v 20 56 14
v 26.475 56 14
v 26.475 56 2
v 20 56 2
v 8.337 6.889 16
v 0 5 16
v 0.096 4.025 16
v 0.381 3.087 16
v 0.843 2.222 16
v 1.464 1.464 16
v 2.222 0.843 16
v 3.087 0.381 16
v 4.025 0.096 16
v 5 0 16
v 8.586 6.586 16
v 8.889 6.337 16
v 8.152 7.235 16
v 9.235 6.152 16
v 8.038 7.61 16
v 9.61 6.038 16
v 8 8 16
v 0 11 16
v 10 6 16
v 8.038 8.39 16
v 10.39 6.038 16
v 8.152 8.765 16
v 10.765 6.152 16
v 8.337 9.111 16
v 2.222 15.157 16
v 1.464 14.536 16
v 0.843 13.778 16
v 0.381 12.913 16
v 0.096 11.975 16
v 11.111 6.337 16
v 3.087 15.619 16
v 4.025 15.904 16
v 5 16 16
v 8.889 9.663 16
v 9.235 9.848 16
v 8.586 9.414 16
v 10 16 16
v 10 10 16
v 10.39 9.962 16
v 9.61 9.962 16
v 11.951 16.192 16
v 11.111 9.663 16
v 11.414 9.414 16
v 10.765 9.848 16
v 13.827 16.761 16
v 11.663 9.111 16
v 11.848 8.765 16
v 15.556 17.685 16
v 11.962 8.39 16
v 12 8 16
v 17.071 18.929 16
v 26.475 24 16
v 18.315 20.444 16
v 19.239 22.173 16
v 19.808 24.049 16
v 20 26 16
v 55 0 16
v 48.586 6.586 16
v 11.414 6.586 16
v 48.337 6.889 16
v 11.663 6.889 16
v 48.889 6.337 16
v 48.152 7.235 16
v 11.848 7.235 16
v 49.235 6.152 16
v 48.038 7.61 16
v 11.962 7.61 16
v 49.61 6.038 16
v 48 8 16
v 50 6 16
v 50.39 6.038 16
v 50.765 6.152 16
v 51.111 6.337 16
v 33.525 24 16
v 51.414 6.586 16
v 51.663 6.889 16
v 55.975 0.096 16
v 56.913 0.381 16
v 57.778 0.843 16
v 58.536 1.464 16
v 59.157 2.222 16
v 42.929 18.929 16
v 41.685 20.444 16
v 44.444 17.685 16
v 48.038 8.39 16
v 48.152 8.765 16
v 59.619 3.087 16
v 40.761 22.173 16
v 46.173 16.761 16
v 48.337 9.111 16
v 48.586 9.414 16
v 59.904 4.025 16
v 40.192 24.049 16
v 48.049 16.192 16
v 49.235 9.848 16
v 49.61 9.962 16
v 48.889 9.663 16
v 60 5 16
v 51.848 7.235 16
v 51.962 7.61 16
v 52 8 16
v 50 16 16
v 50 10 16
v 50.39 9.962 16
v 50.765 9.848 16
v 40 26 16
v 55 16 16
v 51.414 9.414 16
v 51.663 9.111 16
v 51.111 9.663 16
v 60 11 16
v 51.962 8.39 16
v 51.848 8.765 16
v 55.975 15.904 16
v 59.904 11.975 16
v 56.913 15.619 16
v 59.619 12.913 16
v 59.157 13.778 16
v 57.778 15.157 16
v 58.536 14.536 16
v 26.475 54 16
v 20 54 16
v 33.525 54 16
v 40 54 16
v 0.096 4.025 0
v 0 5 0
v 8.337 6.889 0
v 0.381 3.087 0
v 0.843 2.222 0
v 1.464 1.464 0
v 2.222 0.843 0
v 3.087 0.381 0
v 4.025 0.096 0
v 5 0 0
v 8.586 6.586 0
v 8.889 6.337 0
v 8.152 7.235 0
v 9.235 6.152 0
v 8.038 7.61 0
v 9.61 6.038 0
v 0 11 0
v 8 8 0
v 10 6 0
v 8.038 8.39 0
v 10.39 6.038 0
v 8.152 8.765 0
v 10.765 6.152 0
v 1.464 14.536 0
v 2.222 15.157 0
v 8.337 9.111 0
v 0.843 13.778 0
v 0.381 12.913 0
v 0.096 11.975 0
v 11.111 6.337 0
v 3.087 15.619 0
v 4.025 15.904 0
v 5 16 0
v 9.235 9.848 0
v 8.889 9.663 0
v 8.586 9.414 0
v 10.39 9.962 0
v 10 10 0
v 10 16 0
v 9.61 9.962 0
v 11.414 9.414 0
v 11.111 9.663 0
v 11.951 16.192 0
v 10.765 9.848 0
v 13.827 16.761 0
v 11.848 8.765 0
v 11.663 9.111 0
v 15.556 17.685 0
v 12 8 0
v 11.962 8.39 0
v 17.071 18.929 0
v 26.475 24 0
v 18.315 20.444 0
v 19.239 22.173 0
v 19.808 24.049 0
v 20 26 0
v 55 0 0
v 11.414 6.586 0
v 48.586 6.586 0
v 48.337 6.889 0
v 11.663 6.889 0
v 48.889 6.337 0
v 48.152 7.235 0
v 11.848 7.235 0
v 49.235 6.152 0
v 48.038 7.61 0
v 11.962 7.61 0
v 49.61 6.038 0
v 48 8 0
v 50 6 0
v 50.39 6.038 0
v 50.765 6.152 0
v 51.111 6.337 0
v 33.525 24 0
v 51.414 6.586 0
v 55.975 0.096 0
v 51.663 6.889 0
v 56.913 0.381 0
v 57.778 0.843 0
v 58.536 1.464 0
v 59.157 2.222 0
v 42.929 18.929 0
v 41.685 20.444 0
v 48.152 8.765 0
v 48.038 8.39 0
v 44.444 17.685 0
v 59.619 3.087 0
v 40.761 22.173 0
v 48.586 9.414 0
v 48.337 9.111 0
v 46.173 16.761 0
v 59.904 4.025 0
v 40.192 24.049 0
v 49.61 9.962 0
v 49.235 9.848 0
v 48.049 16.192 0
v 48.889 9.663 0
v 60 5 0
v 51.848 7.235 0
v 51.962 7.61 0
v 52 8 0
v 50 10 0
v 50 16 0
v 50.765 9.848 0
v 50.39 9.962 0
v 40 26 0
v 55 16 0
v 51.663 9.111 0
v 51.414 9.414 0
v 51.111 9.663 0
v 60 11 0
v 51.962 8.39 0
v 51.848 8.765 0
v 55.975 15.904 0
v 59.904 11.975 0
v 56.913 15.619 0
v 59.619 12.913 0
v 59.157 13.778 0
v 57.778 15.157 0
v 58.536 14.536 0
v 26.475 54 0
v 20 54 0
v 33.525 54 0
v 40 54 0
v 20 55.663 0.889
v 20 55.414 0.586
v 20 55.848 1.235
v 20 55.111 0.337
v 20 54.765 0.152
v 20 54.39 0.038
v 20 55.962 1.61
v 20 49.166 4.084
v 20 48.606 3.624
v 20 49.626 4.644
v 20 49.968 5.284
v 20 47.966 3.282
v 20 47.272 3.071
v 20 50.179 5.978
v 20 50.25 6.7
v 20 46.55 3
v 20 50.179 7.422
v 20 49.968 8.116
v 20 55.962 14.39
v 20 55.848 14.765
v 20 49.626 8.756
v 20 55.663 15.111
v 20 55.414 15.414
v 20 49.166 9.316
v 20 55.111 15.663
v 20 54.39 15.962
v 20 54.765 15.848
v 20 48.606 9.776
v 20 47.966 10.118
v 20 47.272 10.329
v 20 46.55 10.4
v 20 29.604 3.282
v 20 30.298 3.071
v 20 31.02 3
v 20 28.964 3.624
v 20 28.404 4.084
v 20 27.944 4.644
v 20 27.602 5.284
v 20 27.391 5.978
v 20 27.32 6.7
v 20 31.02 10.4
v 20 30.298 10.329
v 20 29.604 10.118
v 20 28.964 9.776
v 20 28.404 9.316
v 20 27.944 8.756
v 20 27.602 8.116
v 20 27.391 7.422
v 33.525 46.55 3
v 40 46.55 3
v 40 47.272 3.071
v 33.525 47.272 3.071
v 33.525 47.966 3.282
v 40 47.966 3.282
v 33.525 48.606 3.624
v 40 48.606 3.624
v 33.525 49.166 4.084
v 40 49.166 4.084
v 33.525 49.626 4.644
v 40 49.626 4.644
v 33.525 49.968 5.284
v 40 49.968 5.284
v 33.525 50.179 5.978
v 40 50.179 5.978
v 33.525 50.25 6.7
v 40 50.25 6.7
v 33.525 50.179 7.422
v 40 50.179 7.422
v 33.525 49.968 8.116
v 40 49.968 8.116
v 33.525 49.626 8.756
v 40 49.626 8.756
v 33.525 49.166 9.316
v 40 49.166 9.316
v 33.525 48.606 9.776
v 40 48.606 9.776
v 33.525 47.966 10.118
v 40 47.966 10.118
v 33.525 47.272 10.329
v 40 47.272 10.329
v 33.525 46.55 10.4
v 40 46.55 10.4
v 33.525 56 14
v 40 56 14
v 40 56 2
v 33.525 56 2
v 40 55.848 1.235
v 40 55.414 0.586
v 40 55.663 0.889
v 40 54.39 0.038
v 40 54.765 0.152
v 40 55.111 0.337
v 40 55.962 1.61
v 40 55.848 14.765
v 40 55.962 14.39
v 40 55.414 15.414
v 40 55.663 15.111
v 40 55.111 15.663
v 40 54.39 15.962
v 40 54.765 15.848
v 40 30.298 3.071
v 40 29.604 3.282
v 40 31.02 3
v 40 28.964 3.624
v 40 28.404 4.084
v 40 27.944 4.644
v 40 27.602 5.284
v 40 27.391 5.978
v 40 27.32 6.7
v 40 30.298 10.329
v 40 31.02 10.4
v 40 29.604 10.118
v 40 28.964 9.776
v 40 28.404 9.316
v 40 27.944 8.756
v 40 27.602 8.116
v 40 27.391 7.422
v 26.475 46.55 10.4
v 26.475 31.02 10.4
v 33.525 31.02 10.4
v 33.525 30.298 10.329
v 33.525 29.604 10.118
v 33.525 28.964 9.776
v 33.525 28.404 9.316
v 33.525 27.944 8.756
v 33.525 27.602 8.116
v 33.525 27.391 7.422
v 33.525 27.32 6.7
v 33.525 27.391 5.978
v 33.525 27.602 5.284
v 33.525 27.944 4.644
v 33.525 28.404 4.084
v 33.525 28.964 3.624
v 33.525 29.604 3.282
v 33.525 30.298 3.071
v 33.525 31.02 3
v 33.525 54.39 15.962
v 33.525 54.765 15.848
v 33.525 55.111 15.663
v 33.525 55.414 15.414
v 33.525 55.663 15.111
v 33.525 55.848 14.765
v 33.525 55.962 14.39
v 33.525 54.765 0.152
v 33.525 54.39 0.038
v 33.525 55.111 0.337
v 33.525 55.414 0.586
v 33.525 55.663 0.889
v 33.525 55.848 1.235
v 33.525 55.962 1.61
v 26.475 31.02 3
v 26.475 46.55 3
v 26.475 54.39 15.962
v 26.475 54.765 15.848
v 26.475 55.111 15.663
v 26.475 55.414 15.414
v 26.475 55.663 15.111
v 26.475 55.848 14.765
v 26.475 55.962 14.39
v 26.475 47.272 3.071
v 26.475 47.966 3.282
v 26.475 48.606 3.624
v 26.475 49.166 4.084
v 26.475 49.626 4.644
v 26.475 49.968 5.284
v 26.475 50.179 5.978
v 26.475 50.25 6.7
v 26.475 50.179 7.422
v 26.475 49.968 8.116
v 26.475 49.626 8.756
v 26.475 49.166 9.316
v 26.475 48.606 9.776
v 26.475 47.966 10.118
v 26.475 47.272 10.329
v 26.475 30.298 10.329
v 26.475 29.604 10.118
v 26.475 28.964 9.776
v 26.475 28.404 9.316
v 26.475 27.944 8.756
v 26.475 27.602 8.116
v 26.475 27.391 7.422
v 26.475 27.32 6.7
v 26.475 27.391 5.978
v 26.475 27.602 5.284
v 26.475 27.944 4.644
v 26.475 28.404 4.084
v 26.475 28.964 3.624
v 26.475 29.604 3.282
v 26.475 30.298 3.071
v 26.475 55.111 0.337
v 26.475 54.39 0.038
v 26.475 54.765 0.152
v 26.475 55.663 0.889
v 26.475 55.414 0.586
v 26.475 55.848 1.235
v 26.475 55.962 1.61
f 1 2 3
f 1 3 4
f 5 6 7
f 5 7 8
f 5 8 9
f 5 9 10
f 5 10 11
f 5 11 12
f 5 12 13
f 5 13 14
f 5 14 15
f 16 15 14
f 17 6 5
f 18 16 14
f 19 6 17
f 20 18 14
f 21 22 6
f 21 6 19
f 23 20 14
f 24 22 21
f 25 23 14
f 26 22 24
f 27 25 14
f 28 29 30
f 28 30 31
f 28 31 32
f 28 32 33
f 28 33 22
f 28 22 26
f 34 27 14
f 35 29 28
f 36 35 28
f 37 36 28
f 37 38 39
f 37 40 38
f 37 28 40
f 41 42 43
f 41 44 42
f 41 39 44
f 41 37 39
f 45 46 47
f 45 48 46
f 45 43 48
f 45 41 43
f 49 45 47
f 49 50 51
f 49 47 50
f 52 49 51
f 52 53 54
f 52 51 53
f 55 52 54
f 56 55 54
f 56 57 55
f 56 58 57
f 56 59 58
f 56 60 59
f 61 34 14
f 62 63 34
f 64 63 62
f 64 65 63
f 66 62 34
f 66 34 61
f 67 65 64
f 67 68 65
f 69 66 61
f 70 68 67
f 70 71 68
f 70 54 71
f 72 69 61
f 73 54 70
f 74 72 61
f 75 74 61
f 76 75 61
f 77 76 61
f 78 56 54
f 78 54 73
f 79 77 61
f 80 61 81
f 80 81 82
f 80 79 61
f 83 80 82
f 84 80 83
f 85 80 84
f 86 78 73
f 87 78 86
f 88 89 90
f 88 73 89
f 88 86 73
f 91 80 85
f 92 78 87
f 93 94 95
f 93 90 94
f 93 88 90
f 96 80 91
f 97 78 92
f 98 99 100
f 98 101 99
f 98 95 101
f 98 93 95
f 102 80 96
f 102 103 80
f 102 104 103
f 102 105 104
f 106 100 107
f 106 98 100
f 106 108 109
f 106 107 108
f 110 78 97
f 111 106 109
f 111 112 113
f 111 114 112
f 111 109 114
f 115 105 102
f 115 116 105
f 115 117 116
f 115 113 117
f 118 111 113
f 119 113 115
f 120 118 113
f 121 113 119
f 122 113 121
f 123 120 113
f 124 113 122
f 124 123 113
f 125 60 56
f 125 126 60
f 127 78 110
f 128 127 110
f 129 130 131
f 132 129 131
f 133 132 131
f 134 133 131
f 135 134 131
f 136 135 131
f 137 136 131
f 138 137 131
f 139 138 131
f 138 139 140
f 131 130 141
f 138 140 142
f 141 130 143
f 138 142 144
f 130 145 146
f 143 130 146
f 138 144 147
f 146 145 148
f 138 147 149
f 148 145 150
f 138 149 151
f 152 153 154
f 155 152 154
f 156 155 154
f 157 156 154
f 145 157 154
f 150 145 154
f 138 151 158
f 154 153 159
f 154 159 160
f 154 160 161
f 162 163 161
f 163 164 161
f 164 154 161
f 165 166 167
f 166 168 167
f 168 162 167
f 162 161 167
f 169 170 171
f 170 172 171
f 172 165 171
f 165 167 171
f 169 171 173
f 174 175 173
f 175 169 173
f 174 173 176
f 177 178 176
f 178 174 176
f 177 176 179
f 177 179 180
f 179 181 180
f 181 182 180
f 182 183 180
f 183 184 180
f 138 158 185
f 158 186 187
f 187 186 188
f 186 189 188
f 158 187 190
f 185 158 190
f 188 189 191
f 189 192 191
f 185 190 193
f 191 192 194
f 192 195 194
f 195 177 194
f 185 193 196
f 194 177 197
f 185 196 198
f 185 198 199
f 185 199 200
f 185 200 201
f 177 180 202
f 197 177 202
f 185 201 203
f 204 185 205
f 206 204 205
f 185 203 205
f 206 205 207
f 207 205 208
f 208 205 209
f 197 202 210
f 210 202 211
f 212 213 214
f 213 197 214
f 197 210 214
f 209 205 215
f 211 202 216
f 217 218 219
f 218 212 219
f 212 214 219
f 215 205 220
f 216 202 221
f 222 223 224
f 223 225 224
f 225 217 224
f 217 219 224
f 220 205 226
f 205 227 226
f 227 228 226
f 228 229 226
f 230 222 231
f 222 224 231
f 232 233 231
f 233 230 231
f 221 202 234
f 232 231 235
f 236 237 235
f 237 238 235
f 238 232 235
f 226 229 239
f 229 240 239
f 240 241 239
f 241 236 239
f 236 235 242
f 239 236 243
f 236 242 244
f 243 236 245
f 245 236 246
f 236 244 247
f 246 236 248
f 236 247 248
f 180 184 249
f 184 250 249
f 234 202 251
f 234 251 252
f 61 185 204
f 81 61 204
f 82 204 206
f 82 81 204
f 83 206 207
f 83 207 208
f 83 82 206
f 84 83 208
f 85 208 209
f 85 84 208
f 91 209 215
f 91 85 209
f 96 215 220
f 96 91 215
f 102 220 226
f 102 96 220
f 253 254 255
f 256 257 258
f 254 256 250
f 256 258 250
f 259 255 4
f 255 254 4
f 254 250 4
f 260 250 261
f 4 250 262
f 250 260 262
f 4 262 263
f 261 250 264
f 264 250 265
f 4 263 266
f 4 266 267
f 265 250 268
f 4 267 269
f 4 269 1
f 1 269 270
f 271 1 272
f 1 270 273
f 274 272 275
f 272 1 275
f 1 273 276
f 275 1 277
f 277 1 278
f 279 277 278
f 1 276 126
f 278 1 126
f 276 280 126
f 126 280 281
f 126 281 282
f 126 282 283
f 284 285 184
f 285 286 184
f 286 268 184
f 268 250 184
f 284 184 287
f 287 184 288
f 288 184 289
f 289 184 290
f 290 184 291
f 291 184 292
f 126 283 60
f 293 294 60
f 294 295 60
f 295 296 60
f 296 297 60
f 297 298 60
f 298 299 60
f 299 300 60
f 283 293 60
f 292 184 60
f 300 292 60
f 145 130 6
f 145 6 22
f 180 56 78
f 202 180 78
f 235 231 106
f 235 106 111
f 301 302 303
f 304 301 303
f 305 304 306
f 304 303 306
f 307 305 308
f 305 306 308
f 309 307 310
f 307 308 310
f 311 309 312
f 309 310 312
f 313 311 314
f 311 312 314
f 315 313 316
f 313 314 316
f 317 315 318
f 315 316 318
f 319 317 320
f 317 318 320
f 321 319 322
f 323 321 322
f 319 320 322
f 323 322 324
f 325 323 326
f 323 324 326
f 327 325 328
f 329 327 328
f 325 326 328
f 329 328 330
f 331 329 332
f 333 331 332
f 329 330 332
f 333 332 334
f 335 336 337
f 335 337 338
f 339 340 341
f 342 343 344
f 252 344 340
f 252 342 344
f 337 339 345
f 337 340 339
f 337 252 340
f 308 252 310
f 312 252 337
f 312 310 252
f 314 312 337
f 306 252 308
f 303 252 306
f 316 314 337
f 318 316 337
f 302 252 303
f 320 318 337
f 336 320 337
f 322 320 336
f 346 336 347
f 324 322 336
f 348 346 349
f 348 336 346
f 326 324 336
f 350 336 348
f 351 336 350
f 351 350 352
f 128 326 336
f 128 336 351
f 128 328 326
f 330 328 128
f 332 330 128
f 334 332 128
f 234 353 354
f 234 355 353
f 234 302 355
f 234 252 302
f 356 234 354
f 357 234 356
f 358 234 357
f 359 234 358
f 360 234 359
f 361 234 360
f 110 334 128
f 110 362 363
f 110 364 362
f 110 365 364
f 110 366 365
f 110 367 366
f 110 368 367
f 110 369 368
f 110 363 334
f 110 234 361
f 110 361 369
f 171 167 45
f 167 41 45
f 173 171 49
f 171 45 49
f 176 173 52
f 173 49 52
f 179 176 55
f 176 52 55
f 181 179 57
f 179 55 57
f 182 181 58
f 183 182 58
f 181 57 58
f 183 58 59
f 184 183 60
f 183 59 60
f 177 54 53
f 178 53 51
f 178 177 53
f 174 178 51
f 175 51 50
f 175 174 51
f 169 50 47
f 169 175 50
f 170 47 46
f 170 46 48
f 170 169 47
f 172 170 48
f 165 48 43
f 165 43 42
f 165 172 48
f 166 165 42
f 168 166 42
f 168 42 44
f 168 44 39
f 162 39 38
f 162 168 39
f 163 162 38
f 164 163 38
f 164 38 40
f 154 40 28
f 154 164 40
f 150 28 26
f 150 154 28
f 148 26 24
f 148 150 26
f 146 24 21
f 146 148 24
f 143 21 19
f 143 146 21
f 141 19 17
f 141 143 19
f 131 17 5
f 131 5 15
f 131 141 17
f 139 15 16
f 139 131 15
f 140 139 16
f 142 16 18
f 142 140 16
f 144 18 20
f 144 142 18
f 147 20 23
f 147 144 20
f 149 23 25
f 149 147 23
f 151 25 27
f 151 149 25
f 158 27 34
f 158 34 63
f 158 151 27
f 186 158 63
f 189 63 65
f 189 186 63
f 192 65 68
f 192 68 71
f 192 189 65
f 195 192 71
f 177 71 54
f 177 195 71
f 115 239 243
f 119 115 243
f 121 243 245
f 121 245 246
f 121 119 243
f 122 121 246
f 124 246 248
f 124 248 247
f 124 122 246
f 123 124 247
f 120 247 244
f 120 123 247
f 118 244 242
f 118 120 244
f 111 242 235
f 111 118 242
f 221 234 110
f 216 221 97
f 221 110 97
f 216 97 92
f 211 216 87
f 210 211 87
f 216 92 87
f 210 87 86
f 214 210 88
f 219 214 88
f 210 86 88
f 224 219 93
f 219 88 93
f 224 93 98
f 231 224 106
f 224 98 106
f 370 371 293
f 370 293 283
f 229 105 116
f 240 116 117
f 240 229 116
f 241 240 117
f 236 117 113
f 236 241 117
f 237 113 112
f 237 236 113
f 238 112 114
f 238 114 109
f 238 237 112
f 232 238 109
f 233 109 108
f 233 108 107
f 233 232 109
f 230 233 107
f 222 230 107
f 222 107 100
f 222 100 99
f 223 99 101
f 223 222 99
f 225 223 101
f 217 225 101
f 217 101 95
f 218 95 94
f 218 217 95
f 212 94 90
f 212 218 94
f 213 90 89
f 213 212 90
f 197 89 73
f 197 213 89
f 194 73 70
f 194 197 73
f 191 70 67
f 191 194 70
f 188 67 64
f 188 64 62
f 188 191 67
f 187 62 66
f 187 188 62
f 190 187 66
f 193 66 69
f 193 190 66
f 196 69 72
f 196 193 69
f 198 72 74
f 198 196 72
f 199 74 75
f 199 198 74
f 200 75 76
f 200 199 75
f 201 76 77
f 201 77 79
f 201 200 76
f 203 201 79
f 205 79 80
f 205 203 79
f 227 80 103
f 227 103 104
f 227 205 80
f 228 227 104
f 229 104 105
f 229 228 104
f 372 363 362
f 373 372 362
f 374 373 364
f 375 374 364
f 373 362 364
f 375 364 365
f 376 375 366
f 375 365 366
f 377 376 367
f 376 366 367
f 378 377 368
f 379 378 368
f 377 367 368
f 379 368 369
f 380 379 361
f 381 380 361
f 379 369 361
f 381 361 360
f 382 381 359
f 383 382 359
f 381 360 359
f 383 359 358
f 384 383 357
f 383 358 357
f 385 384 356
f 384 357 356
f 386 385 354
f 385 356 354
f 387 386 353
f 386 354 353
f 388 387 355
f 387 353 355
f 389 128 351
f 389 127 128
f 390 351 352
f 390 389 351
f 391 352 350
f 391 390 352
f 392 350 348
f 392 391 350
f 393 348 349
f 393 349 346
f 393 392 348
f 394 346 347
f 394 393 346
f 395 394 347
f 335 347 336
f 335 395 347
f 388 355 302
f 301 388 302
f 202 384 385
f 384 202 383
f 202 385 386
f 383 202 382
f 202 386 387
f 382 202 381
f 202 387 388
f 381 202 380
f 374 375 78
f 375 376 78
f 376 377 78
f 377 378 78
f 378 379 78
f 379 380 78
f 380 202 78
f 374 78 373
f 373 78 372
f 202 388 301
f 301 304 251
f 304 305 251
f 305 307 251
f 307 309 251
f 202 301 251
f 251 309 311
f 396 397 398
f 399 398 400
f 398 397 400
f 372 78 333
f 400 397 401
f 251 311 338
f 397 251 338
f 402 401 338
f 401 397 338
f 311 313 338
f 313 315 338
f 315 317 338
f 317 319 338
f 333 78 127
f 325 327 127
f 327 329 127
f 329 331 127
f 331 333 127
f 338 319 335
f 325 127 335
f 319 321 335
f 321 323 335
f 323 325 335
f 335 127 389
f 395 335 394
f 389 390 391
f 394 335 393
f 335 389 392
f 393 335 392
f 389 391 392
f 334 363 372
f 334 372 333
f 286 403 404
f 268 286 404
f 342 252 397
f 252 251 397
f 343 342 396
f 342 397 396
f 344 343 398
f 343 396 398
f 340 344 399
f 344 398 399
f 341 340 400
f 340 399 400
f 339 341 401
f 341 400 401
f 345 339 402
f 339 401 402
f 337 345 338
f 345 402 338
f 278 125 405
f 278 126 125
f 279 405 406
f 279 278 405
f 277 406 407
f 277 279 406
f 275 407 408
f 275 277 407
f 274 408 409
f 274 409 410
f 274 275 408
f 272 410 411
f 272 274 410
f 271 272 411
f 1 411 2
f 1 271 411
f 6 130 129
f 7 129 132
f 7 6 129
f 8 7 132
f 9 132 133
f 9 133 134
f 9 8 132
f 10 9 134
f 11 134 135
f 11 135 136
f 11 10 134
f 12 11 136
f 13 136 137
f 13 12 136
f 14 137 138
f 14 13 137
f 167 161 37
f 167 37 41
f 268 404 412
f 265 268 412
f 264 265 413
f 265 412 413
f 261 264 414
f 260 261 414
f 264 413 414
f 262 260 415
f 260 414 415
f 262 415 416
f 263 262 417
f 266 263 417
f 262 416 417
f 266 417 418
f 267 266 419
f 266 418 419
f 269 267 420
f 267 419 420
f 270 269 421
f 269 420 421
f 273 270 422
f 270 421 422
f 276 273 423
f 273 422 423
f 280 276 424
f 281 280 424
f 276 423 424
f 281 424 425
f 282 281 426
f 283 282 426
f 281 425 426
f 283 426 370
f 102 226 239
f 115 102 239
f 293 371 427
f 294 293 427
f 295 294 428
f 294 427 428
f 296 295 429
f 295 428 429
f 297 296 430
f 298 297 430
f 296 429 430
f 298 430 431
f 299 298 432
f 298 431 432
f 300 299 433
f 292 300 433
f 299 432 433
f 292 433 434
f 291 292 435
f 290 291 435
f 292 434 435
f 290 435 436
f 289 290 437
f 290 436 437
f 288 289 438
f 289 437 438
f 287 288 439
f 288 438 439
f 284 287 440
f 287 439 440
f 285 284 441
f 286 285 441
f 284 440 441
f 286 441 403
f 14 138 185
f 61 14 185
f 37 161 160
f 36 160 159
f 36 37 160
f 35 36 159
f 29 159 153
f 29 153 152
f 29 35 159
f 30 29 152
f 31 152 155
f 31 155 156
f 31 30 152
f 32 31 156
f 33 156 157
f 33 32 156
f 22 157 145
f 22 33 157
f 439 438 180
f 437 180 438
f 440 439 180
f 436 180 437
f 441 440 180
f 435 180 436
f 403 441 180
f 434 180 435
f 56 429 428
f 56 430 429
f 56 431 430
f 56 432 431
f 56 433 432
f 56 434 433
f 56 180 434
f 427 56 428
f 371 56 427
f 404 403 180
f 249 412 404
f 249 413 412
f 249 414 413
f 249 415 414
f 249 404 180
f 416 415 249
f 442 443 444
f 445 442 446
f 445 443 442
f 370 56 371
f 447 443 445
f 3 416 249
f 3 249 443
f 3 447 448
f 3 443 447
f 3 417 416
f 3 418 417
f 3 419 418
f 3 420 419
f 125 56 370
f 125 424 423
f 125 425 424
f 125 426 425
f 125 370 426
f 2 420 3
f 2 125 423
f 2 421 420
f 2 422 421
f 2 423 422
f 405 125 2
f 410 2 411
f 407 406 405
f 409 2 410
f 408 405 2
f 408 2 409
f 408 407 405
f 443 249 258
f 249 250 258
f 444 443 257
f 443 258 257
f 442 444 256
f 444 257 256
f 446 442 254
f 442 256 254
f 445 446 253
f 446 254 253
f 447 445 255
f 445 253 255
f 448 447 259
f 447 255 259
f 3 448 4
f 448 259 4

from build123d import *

# Parameters (mm, degrees)
SKETCH_W        = 60
SKETCH_H        = 16
SKETCH_R        = 2
PAD_DEPTH       = 16
SKETCH002_W     = 20
SKETCH002_H     = 16
PAD001_DEPTH    = 40
SKETCH003_W     = 7.05
SKETCH003_H     = 32
POCKET_DEPTH    = 16.001
POCKET001_DEPTH = 40.001
FILLET_R        = 10
FILLET001_R     = 2
FILLET002_R     = 5


with BuildPart() as part:
    # Sketch → Pad (new body)
    with BuildSketch(Plane.XY):
        with Locations((30, 8)):
            Rectangle(SKETCH_W, SKETCH_H)
        with Locations((10, 8)):
            Circle(SKETCH_R, mode=Mode.SUBTRACT)
        with Locations((50, 8)):
            Circle(SKETCH_R, mode=Mode.SUBTRACT)
    extrude(amount=PAD_DEPTH)

    # Sketch002 (on Face3 of Pad) → Pad001 (join)
    with BuildSketch(Plane(origin=(0, 16, 0), x_dir=(-1, 0, 0), z_dir=(0, 1, 0))):
        with Locations((-30, 8)):
            Rectangle(SKETCH002_W, SKETCH002_H)
    extrude(amount=PAD001_DEPTH)

    # Sketch003 (on Face12 of Pad001) → Pocket (cut, through all)
    with BuildSketch(Plane.XY.offset(16)):
        with Locations((30, 40)):
            Rectangle(SKETCH003_W, SKETCH003_H)
    extrude(amount=-POCKET_DEPTH, mode=Mode.SUBTRACT)

    # Sketch004 (on Face8 of Pocket) → Pocket001 (cut, through all)
    with BuildSketch(Plane.YZ.offset(40)):
        with BuildLine():
            ThreePointArc((31.02, 10.4), (27.32, 6.7), (31.02, 3))
            Line((31.02, 3), (46.55, 3))
            ThreePointArc((46.55, 3), (50.25, 6.7), (46.55, 10.4))
            Line((31.02, 10.4), (46.55, 10.4))
        make_face()
    extrude(amount=-POCKET001_DEPTH, mode=Mode.SUBTRACT)

    # Fillet
    fillet_edges = [part.edges().sort_by_distance(p)[0] for p in [
        (20, 16, 8),
        (40, 16, 8),
    ]]
    fillet(fillet_edges, radius=FILLET_R)

    # Fillet001
    fillet001_edges = [part.edges().sort_by_distance(p)[0] for p in [
        (36.7625, 56, 16),
        (23.2375, 56, 16),
        (23.2375, 56, 0),
        (36.7625, 56, 0),
    ]]
    fillet(fillet001_edges, radius=FILLET001_R)

    # Fillet002
    fillet002_edges = [part.edges().sort_by_distance(p)[0] for p in [
        (0, 16, 8),
        (0, 0, 8),
        (60, 0, 8),
        (60, 16, 8),
    ]]
    fillet(fillet002_edges, radius=FILLET002_R)


solid = part.part
